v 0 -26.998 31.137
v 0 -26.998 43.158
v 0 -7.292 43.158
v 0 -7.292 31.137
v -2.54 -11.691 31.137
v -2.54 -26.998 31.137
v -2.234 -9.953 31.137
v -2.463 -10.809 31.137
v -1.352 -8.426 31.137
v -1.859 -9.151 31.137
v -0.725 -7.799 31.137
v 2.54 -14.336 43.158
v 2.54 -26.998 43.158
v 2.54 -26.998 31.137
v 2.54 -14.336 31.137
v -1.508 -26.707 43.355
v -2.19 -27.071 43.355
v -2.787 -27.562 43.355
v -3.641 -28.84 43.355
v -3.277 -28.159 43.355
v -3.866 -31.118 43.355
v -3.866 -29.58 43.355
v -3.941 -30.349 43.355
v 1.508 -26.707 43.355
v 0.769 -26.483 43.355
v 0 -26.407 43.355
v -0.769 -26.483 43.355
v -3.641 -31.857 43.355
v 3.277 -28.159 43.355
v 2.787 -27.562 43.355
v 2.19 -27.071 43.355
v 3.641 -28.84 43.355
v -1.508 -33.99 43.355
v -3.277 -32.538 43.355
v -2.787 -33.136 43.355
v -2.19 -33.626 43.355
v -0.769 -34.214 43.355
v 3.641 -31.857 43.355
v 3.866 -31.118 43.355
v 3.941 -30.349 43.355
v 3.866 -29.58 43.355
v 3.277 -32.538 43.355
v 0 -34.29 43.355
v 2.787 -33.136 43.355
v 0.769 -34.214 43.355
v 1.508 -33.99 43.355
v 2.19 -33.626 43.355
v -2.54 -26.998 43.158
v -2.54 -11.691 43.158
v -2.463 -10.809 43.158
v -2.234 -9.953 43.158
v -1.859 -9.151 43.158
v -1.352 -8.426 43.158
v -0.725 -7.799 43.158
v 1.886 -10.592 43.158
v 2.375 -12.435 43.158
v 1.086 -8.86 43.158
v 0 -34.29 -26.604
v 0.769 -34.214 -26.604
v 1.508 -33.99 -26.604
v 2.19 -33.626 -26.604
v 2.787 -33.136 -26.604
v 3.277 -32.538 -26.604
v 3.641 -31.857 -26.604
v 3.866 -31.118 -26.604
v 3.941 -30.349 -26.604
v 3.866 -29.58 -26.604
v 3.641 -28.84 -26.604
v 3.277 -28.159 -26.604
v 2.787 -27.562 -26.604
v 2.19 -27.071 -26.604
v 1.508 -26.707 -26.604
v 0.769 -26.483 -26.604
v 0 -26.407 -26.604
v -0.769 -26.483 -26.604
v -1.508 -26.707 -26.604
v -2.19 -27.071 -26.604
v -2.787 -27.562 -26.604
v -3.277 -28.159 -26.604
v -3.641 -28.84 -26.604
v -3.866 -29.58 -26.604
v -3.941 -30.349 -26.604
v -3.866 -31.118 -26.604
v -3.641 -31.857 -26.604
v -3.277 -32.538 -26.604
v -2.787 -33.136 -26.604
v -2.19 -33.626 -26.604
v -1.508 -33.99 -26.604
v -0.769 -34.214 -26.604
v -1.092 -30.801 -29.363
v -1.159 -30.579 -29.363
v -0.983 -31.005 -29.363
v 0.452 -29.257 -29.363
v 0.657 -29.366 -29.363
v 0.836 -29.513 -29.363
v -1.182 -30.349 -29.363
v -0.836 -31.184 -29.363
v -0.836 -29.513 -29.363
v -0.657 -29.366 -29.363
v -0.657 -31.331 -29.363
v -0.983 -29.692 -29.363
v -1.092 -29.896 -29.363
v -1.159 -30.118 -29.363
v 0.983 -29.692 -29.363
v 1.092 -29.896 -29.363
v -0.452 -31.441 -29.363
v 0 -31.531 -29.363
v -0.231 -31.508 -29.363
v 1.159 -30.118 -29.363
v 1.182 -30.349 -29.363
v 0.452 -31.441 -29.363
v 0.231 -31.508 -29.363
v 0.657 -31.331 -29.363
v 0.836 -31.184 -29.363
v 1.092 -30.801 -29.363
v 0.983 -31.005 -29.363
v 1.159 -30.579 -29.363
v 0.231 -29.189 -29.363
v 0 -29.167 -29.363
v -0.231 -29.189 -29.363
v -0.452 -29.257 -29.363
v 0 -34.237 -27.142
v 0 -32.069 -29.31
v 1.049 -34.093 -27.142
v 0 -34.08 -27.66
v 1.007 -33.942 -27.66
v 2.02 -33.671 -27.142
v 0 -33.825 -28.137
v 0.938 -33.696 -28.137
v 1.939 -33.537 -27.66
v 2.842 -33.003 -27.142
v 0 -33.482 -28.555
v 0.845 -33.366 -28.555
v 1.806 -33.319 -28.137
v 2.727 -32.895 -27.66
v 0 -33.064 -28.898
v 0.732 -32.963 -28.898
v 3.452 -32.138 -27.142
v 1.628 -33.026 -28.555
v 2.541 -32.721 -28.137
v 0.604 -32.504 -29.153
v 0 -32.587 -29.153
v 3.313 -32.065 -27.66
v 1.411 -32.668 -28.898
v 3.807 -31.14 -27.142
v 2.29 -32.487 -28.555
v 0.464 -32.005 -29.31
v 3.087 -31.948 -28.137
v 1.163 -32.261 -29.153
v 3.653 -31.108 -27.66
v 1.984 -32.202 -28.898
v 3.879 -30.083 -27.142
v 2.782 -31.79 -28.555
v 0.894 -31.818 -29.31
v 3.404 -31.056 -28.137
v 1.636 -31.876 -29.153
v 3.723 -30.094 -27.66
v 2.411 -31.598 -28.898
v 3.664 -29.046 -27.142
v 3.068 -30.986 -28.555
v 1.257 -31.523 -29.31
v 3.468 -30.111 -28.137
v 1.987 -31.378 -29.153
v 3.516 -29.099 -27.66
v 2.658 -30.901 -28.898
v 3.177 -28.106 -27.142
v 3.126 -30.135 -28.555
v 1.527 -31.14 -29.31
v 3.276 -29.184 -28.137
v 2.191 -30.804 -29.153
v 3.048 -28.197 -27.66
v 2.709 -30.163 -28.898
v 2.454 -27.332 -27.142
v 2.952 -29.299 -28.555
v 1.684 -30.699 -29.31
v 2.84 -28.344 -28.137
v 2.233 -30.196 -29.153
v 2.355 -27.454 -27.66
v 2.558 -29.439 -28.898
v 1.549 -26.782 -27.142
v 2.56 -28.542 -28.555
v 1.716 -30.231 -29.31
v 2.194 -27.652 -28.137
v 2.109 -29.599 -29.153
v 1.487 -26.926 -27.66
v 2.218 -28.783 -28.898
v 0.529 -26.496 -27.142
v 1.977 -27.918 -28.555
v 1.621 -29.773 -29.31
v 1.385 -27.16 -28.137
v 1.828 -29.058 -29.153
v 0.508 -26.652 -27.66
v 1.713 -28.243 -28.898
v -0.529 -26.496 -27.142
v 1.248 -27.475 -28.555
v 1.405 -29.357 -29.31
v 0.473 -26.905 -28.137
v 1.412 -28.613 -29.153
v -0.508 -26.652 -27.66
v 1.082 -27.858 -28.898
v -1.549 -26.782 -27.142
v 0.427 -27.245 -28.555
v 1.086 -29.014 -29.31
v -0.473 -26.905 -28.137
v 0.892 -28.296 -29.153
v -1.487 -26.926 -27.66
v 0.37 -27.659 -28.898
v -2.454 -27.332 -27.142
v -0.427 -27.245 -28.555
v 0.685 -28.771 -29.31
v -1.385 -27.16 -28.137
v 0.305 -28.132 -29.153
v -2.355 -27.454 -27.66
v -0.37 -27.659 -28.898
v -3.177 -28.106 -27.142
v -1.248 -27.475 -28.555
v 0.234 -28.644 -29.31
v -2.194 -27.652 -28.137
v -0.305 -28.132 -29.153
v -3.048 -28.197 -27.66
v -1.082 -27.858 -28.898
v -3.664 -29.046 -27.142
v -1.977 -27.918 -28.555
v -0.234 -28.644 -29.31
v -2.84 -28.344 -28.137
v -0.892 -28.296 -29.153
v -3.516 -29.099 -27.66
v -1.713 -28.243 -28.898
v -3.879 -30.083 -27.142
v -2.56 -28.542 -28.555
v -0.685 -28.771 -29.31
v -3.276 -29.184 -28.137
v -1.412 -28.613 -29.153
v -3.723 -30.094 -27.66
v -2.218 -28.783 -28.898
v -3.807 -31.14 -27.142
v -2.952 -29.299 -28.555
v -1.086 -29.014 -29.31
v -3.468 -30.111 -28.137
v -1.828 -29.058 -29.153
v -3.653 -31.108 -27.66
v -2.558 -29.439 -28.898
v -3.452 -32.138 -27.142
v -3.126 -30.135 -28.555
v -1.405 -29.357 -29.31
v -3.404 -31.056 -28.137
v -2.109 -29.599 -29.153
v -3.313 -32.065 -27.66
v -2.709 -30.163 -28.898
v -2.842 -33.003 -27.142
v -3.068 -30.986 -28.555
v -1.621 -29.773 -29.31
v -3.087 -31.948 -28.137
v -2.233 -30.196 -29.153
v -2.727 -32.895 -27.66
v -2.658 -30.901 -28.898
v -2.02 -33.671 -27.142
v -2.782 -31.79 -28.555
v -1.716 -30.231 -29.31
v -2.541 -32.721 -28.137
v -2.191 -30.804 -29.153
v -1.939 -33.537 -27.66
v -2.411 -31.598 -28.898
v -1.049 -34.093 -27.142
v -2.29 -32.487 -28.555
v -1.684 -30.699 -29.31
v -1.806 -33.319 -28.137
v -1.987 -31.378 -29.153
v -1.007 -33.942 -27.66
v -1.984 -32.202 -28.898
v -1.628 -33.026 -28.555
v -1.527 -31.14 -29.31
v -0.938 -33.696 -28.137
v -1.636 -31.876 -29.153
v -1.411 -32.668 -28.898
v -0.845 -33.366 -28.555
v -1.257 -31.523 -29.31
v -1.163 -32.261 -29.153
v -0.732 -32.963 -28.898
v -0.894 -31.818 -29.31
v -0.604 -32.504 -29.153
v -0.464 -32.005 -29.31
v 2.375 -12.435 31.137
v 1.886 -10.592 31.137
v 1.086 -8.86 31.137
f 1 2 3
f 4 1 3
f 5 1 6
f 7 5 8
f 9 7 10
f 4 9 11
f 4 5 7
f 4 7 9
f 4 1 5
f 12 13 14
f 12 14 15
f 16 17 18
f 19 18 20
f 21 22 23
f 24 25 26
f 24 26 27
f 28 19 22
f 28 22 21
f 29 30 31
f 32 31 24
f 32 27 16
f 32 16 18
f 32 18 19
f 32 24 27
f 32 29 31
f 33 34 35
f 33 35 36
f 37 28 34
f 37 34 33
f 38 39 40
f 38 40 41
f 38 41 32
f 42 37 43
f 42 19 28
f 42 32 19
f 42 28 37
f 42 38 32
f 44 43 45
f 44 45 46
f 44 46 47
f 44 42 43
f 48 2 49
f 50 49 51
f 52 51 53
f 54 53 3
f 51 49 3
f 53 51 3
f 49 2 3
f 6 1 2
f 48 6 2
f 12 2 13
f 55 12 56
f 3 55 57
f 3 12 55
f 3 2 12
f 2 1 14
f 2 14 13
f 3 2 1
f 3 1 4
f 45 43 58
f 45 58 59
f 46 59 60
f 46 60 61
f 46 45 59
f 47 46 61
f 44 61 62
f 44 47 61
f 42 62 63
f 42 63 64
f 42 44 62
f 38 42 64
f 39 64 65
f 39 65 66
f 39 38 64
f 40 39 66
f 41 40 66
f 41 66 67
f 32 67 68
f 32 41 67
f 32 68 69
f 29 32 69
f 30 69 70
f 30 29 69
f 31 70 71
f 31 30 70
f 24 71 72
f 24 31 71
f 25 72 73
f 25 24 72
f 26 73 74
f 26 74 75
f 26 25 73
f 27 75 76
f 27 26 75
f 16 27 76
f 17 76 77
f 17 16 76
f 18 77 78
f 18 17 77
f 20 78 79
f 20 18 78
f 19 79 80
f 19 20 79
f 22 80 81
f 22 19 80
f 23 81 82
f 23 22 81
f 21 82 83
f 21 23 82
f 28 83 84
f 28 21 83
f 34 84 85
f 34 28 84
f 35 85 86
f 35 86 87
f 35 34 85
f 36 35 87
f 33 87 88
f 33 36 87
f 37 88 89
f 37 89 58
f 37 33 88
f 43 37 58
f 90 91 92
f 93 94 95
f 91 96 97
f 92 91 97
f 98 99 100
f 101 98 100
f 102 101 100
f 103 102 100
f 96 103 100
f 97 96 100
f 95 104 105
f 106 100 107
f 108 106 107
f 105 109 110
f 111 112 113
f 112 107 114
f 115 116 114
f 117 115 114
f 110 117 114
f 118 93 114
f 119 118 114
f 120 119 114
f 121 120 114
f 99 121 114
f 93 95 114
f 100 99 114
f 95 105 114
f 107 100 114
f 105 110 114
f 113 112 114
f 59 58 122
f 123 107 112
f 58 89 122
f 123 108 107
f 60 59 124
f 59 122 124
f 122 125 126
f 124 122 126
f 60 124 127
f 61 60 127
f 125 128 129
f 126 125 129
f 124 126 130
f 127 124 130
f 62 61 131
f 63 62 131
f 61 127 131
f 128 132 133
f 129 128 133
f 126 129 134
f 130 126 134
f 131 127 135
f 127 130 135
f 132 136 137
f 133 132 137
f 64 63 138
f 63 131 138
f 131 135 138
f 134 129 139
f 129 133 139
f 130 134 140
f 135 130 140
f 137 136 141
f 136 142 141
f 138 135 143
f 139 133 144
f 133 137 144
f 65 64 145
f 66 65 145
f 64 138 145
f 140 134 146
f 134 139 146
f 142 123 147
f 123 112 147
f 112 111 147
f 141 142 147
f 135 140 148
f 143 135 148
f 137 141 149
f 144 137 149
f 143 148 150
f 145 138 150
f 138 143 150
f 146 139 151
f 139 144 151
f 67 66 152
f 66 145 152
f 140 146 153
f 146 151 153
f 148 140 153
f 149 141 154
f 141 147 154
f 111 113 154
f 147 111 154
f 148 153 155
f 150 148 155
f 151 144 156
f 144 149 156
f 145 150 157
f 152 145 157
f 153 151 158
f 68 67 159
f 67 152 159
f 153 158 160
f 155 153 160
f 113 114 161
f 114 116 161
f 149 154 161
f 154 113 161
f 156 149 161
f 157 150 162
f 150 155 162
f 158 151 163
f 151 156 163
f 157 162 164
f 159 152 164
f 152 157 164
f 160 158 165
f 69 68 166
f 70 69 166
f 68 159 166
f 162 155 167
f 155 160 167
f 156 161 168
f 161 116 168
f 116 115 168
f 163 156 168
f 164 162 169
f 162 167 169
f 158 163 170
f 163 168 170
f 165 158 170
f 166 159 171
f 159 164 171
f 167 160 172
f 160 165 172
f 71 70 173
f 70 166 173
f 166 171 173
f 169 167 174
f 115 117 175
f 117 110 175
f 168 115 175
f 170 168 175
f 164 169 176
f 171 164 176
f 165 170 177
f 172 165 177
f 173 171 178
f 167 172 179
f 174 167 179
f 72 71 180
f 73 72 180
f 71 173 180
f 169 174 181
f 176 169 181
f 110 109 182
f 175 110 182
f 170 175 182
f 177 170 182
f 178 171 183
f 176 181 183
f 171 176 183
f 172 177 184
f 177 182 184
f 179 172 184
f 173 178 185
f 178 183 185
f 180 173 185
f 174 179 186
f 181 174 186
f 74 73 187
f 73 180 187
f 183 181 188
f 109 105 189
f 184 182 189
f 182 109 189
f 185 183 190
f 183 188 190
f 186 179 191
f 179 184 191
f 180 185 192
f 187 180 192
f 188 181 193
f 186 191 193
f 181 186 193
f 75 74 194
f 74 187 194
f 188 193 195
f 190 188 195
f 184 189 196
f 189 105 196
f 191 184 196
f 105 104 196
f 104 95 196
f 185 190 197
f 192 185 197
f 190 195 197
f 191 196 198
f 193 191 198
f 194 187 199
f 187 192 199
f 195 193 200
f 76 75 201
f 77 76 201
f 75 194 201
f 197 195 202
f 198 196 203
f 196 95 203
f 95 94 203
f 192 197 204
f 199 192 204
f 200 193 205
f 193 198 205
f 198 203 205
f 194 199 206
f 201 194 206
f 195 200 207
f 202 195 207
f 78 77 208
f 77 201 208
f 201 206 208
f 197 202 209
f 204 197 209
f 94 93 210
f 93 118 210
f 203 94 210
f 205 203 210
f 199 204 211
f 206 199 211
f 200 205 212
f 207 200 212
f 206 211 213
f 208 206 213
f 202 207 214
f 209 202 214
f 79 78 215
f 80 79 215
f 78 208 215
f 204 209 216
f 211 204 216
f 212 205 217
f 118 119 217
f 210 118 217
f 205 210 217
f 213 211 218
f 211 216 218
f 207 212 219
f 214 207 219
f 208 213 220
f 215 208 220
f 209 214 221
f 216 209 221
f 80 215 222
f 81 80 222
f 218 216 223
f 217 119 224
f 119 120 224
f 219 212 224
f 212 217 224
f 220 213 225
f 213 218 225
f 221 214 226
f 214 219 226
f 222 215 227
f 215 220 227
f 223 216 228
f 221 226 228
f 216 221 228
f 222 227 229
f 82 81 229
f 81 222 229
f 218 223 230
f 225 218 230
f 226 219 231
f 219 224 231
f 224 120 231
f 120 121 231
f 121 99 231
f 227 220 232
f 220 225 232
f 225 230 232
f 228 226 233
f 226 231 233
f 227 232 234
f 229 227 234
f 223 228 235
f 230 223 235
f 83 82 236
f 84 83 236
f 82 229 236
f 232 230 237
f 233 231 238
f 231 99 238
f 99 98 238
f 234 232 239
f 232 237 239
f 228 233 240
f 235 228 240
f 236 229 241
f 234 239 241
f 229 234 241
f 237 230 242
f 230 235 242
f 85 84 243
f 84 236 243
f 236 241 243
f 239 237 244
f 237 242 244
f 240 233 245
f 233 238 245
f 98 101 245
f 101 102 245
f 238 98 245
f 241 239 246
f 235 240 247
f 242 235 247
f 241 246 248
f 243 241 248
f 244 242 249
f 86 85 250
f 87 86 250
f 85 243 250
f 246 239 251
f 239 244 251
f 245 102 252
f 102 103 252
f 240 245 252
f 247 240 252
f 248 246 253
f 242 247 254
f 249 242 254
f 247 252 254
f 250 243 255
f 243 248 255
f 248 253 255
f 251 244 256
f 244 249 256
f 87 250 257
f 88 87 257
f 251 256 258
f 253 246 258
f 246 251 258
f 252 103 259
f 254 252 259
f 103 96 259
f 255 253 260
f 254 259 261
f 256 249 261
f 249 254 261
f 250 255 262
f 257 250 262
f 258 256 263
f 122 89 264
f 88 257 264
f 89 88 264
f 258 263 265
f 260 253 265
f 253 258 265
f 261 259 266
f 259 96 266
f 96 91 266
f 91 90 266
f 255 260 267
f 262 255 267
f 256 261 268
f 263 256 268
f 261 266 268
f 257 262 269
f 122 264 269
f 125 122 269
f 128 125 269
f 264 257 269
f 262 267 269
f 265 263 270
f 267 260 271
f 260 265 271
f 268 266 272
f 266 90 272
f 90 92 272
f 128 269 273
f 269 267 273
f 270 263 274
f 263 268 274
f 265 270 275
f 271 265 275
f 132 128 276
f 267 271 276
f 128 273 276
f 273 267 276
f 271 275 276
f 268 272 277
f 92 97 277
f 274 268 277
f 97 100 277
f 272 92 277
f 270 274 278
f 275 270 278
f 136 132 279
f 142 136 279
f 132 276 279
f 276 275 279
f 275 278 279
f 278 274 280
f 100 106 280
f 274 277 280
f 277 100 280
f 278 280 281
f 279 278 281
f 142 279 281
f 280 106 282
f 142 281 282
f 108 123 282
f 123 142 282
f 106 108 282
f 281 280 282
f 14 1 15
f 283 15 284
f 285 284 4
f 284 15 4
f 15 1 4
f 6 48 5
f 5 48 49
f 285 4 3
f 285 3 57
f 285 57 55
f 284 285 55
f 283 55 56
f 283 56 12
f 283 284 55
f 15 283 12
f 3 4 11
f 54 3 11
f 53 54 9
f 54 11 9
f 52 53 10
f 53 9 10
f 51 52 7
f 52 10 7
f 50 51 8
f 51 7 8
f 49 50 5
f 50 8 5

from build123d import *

# Parameters (mm, degrees)
F0_W        = 3.9413794875
F0_H        = 72.7184470743
F2_W        = 19.7068979032
F2_H        = 12.0212044567
F3_DEPTH    = 2.54
F4_T1_DEPTH = 47.2420593542
F5_DEPTH    = 2.54
F6_T1_DEPTH = 34.0182497128
F7_R        = 2.7594461018


# Not quite as in the source:
# - a fillet or chamfer that OpenCascade refuses, or shapes differently, is made with other operations: its cross-section is extruded or revolved along the edge and cut away or added


with BuildPart() as f1:
    # F0 (on Right) → F1 (revolve)
    with BuildSketch(Plane.YZ):
        with Locations((-32.3193110526, 6.9959471002)):
            Rectangle(F0_W, F0_H)
    revolve(axis=Axis((0, -30.3486213088, 6.9959471002), (0, 0, 1)))

    # F7
    f7_edges = [f1.edges().sort_by_distance(p)[0] for p in [
        (0, -26.407242, -29.363276),
    ]]
    fillet(f7_edges, radius=F7_R)


with BuildPart() as f3:
    # F2 (on Right) → F3 (new body)
    with BuildSketch(Plane.YZ):
        with Locations((-17.1450001653, 37.1475005522)):
            Rectangle(F2_W, F2_H)
    extrude(amount=F3_DEPTH)

    # F4: fillet of radius 11.0377844072 on 1 edges, made by hand

    # F4_s2 → F4_t1 (cut)
    with BuildSketch(Plane.XY.offset(13.5264708751)):
        with BuildLine():
            ThreePointArc((0, -7.2915512137), (1.8856012845, -10.5916620712), (2.54, -14.3357221932))
            Line((2.54, -14.3357221932), (2.54, -7.2915512137))
            Line((2.54, -7.2915512137), (0, -7.2915512137))
        make_face()
    extrude(amount=F4_T1_DEPTH, mode=Mode.SUBTRACT)


with BuildPart() as f5:
    # F2 (on Right) → F5 (new body)
    with BuildSketch(Plane.YZ):
        with Locations((-17.1450001653, 37.1475005522)):
            Rectangle(F2_W, F2_H)
    extrude(amount=-F5_DEPTH)

    # F6: fillet of radius 5.08 on 1 edges, made by hand

    # F6_s2 → F6_t1 (cut)
    with BuildSketch(Plane.XY.offset(20.1383756958)):
        with BuildLine():
            ThreePointArc((0, -7.2915512137), (-1.8594090512, -9.1509602649), (-2.54, -11.6909602649))
            Line((-2.54, -11.6909602649), (-2.54, -7.2915512137))
            Line((-2.54, -7.2915512137), (0, -7.2915512137))
        make_face()
    extrude(amount=F6_T1_DEPTH, mode=Mode.SUBTRACT)


solid = Compound([f1.part, f3.part, f5.part])
